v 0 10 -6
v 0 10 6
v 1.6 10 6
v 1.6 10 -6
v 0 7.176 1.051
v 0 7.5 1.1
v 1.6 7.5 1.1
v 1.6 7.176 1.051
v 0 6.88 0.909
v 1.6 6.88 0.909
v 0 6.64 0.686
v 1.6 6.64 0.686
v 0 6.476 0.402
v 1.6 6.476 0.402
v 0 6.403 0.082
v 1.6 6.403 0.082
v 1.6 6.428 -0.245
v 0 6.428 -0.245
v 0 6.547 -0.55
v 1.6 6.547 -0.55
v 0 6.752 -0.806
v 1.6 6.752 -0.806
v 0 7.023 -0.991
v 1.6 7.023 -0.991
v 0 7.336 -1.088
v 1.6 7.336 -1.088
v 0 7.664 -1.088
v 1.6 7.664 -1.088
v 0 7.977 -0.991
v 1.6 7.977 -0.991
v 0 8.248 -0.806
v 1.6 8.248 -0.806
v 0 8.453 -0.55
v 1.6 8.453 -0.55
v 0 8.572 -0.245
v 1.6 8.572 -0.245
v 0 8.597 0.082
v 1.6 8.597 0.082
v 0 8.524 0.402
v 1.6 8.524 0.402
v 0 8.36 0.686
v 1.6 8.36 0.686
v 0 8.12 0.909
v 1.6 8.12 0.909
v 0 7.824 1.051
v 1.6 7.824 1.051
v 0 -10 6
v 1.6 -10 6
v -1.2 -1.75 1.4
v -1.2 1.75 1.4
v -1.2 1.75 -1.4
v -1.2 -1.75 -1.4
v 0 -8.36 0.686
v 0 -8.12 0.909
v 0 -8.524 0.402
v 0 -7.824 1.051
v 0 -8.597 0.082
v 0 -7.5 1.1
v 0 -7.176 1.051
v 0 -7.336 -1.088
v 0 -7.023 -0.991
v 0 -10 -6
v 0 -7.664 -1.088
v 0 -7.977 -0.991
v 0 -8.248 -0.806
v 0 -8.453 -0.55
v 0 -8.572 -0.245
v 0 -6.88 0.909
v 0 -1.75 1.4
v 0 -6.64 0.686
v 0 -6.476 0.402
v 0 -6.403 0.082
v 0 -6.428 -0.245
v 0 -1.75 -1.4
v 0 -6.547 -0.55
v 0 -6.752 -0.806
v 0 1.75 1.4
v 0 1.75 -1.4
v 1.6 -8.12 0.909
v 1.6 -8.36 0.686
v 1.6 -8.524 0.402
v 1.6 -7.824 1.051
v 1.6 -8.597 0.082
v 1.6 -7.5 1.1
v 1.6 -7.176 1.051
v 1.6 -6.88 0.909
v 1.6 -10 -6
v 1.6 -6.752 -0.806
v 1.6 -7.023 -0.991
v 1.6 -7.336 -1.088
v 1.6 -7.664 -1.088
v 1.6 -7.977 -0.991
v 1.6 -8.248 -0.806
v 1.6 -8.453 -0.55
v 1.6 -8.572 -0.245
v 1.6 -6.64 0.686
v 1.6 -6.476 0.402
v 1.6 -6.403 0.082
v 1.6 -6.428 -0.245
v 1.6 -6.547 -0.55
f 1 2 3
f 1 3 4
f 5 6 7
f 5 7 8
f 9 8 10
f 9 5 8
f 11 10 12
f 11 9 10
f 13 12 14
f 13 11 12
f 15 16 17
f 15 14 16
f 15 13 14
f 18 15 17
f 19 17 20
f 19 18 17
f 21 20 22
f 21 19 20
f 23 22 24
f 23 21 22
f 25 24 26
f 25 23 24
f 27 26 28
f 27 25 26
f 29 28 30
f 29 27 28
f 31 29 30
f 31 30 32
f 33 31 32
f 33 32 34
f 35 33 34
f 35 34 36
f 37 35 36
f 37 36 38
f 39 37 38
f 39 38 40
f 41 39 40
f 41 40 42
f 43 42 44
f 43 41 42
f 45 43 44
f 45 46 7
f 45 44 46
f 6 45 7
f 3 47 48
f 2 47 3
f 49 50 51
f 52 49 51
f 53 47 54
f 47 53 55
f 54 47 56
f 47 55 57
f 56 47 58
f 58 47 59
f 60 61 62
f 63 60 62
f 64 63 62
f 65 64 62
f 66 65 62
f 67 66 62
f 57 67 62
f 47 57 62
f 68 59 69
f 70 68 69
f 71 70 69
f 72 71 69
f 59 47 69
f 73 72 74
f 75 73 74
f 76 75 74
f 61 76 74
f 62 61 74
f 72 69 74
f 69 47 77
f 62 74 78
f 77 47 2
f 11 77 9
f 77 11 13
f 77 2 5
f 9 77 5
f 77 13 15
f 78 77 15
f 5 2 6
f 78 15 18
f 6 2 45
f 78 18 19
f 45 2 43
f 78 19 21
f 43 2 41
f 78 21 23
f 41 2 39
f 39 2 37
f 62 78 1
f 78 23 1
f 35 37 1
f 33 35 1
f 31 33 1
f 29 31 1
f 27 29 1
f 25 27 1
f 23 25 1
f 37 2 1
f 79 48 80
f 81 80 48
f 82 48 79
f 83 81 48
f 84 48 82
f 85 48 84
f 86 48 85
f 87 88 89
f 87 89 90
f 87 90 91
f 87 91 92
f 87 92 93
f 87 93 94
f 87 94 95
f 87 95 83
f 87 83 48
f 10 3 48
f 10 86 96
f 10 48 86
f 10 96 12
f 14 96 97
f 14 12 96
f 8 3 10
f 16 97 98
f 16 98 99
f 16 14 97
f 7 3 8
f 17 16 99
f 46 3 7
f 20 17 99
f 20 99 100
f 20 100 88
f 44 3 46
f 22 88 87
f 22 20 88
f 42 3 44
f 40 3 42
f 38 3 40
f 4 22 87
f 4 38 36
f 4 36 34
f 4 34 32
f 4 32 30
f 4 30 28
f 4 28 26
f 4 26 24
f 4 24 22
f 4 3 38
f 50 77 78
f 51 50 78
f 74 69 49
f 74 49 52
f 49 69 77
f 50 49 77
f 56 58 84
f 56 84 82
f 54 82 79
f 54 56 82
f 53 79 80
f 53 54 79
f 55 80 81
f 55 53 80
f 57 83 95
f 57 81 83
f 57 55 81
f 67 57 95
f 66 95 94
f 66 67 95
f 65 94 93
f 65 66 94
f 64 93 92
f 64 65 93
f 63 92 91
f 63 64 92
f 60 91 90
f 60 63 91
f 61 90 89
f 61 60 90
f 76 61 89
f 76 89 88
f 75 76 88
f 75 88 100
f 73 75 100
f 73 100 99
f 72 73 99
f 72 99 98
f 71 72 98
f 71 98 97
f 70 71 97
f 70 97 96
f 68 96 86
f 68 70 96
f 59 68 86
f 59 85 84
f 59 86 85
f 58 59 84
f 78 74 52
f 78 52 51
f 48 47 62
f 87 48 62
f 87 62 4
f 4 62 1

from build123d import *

# Parameters (mm, degrees)
SKETCH1_W           = 12
SKETCH1_H           = 20
BOARD_DEPTH         = 1.6
SKETCH2_W           = 2.8
SKETCH2_H           = 3.5
UV_SENSOR_DEPTH     = 1.2
HOLES_M2_DEPTH      = 12.771151176
HOLES_M2_DEPTH_BACK = 12.771151176
SKETCH3_R           = 1.1


with BuildPart() as part:
    # Sketch1 → Board (new body)
    with BuildSketch(Plane(origin=(0, 0, 0), x_dir=(0, 0, -1), z_dir=(1, 0, 0))):
        Rectangle(SKETCH1_W, SKETCH1_H)
    extrude(amount=BOARD_DEPTH)

    # Sketch2 → UV_Sensor (add)
    with BuildSketch(Plane(origin=(0, 0, 0), x_dir=(0, 0, -1), z_dir=(1, 0, 0))):
        Rectangle(SKETCH2_W, SKETCH2_H)
    extrude(amount=-UV_SENSOR_DEPTH)

    # Sketch3 → Holes_M2 (cut, two sides: drawn at the far end of the back side and taken through both)
    with BuildSketch(Plane(origin=(0, 0, 0), x_dir=(0, 0, -1), z_dir=(1, 0, 0)).offset(-HOLES_M2_DEPTH_BACK)):
        with Locations(Location((0, -7.5, 0), (0, 0, 180))):
            Circle(SKETCH3_R)
        with Locations(Location((0, 7.5, 0), (0, 0, 180))):
            Circle(SKETCH3_R)
    extrude(amount=HOLES_M2_DEPTH + HOLES_M2_DEPTH_BACK, mode=Mode.SUBTRACT)


solid = part.part
